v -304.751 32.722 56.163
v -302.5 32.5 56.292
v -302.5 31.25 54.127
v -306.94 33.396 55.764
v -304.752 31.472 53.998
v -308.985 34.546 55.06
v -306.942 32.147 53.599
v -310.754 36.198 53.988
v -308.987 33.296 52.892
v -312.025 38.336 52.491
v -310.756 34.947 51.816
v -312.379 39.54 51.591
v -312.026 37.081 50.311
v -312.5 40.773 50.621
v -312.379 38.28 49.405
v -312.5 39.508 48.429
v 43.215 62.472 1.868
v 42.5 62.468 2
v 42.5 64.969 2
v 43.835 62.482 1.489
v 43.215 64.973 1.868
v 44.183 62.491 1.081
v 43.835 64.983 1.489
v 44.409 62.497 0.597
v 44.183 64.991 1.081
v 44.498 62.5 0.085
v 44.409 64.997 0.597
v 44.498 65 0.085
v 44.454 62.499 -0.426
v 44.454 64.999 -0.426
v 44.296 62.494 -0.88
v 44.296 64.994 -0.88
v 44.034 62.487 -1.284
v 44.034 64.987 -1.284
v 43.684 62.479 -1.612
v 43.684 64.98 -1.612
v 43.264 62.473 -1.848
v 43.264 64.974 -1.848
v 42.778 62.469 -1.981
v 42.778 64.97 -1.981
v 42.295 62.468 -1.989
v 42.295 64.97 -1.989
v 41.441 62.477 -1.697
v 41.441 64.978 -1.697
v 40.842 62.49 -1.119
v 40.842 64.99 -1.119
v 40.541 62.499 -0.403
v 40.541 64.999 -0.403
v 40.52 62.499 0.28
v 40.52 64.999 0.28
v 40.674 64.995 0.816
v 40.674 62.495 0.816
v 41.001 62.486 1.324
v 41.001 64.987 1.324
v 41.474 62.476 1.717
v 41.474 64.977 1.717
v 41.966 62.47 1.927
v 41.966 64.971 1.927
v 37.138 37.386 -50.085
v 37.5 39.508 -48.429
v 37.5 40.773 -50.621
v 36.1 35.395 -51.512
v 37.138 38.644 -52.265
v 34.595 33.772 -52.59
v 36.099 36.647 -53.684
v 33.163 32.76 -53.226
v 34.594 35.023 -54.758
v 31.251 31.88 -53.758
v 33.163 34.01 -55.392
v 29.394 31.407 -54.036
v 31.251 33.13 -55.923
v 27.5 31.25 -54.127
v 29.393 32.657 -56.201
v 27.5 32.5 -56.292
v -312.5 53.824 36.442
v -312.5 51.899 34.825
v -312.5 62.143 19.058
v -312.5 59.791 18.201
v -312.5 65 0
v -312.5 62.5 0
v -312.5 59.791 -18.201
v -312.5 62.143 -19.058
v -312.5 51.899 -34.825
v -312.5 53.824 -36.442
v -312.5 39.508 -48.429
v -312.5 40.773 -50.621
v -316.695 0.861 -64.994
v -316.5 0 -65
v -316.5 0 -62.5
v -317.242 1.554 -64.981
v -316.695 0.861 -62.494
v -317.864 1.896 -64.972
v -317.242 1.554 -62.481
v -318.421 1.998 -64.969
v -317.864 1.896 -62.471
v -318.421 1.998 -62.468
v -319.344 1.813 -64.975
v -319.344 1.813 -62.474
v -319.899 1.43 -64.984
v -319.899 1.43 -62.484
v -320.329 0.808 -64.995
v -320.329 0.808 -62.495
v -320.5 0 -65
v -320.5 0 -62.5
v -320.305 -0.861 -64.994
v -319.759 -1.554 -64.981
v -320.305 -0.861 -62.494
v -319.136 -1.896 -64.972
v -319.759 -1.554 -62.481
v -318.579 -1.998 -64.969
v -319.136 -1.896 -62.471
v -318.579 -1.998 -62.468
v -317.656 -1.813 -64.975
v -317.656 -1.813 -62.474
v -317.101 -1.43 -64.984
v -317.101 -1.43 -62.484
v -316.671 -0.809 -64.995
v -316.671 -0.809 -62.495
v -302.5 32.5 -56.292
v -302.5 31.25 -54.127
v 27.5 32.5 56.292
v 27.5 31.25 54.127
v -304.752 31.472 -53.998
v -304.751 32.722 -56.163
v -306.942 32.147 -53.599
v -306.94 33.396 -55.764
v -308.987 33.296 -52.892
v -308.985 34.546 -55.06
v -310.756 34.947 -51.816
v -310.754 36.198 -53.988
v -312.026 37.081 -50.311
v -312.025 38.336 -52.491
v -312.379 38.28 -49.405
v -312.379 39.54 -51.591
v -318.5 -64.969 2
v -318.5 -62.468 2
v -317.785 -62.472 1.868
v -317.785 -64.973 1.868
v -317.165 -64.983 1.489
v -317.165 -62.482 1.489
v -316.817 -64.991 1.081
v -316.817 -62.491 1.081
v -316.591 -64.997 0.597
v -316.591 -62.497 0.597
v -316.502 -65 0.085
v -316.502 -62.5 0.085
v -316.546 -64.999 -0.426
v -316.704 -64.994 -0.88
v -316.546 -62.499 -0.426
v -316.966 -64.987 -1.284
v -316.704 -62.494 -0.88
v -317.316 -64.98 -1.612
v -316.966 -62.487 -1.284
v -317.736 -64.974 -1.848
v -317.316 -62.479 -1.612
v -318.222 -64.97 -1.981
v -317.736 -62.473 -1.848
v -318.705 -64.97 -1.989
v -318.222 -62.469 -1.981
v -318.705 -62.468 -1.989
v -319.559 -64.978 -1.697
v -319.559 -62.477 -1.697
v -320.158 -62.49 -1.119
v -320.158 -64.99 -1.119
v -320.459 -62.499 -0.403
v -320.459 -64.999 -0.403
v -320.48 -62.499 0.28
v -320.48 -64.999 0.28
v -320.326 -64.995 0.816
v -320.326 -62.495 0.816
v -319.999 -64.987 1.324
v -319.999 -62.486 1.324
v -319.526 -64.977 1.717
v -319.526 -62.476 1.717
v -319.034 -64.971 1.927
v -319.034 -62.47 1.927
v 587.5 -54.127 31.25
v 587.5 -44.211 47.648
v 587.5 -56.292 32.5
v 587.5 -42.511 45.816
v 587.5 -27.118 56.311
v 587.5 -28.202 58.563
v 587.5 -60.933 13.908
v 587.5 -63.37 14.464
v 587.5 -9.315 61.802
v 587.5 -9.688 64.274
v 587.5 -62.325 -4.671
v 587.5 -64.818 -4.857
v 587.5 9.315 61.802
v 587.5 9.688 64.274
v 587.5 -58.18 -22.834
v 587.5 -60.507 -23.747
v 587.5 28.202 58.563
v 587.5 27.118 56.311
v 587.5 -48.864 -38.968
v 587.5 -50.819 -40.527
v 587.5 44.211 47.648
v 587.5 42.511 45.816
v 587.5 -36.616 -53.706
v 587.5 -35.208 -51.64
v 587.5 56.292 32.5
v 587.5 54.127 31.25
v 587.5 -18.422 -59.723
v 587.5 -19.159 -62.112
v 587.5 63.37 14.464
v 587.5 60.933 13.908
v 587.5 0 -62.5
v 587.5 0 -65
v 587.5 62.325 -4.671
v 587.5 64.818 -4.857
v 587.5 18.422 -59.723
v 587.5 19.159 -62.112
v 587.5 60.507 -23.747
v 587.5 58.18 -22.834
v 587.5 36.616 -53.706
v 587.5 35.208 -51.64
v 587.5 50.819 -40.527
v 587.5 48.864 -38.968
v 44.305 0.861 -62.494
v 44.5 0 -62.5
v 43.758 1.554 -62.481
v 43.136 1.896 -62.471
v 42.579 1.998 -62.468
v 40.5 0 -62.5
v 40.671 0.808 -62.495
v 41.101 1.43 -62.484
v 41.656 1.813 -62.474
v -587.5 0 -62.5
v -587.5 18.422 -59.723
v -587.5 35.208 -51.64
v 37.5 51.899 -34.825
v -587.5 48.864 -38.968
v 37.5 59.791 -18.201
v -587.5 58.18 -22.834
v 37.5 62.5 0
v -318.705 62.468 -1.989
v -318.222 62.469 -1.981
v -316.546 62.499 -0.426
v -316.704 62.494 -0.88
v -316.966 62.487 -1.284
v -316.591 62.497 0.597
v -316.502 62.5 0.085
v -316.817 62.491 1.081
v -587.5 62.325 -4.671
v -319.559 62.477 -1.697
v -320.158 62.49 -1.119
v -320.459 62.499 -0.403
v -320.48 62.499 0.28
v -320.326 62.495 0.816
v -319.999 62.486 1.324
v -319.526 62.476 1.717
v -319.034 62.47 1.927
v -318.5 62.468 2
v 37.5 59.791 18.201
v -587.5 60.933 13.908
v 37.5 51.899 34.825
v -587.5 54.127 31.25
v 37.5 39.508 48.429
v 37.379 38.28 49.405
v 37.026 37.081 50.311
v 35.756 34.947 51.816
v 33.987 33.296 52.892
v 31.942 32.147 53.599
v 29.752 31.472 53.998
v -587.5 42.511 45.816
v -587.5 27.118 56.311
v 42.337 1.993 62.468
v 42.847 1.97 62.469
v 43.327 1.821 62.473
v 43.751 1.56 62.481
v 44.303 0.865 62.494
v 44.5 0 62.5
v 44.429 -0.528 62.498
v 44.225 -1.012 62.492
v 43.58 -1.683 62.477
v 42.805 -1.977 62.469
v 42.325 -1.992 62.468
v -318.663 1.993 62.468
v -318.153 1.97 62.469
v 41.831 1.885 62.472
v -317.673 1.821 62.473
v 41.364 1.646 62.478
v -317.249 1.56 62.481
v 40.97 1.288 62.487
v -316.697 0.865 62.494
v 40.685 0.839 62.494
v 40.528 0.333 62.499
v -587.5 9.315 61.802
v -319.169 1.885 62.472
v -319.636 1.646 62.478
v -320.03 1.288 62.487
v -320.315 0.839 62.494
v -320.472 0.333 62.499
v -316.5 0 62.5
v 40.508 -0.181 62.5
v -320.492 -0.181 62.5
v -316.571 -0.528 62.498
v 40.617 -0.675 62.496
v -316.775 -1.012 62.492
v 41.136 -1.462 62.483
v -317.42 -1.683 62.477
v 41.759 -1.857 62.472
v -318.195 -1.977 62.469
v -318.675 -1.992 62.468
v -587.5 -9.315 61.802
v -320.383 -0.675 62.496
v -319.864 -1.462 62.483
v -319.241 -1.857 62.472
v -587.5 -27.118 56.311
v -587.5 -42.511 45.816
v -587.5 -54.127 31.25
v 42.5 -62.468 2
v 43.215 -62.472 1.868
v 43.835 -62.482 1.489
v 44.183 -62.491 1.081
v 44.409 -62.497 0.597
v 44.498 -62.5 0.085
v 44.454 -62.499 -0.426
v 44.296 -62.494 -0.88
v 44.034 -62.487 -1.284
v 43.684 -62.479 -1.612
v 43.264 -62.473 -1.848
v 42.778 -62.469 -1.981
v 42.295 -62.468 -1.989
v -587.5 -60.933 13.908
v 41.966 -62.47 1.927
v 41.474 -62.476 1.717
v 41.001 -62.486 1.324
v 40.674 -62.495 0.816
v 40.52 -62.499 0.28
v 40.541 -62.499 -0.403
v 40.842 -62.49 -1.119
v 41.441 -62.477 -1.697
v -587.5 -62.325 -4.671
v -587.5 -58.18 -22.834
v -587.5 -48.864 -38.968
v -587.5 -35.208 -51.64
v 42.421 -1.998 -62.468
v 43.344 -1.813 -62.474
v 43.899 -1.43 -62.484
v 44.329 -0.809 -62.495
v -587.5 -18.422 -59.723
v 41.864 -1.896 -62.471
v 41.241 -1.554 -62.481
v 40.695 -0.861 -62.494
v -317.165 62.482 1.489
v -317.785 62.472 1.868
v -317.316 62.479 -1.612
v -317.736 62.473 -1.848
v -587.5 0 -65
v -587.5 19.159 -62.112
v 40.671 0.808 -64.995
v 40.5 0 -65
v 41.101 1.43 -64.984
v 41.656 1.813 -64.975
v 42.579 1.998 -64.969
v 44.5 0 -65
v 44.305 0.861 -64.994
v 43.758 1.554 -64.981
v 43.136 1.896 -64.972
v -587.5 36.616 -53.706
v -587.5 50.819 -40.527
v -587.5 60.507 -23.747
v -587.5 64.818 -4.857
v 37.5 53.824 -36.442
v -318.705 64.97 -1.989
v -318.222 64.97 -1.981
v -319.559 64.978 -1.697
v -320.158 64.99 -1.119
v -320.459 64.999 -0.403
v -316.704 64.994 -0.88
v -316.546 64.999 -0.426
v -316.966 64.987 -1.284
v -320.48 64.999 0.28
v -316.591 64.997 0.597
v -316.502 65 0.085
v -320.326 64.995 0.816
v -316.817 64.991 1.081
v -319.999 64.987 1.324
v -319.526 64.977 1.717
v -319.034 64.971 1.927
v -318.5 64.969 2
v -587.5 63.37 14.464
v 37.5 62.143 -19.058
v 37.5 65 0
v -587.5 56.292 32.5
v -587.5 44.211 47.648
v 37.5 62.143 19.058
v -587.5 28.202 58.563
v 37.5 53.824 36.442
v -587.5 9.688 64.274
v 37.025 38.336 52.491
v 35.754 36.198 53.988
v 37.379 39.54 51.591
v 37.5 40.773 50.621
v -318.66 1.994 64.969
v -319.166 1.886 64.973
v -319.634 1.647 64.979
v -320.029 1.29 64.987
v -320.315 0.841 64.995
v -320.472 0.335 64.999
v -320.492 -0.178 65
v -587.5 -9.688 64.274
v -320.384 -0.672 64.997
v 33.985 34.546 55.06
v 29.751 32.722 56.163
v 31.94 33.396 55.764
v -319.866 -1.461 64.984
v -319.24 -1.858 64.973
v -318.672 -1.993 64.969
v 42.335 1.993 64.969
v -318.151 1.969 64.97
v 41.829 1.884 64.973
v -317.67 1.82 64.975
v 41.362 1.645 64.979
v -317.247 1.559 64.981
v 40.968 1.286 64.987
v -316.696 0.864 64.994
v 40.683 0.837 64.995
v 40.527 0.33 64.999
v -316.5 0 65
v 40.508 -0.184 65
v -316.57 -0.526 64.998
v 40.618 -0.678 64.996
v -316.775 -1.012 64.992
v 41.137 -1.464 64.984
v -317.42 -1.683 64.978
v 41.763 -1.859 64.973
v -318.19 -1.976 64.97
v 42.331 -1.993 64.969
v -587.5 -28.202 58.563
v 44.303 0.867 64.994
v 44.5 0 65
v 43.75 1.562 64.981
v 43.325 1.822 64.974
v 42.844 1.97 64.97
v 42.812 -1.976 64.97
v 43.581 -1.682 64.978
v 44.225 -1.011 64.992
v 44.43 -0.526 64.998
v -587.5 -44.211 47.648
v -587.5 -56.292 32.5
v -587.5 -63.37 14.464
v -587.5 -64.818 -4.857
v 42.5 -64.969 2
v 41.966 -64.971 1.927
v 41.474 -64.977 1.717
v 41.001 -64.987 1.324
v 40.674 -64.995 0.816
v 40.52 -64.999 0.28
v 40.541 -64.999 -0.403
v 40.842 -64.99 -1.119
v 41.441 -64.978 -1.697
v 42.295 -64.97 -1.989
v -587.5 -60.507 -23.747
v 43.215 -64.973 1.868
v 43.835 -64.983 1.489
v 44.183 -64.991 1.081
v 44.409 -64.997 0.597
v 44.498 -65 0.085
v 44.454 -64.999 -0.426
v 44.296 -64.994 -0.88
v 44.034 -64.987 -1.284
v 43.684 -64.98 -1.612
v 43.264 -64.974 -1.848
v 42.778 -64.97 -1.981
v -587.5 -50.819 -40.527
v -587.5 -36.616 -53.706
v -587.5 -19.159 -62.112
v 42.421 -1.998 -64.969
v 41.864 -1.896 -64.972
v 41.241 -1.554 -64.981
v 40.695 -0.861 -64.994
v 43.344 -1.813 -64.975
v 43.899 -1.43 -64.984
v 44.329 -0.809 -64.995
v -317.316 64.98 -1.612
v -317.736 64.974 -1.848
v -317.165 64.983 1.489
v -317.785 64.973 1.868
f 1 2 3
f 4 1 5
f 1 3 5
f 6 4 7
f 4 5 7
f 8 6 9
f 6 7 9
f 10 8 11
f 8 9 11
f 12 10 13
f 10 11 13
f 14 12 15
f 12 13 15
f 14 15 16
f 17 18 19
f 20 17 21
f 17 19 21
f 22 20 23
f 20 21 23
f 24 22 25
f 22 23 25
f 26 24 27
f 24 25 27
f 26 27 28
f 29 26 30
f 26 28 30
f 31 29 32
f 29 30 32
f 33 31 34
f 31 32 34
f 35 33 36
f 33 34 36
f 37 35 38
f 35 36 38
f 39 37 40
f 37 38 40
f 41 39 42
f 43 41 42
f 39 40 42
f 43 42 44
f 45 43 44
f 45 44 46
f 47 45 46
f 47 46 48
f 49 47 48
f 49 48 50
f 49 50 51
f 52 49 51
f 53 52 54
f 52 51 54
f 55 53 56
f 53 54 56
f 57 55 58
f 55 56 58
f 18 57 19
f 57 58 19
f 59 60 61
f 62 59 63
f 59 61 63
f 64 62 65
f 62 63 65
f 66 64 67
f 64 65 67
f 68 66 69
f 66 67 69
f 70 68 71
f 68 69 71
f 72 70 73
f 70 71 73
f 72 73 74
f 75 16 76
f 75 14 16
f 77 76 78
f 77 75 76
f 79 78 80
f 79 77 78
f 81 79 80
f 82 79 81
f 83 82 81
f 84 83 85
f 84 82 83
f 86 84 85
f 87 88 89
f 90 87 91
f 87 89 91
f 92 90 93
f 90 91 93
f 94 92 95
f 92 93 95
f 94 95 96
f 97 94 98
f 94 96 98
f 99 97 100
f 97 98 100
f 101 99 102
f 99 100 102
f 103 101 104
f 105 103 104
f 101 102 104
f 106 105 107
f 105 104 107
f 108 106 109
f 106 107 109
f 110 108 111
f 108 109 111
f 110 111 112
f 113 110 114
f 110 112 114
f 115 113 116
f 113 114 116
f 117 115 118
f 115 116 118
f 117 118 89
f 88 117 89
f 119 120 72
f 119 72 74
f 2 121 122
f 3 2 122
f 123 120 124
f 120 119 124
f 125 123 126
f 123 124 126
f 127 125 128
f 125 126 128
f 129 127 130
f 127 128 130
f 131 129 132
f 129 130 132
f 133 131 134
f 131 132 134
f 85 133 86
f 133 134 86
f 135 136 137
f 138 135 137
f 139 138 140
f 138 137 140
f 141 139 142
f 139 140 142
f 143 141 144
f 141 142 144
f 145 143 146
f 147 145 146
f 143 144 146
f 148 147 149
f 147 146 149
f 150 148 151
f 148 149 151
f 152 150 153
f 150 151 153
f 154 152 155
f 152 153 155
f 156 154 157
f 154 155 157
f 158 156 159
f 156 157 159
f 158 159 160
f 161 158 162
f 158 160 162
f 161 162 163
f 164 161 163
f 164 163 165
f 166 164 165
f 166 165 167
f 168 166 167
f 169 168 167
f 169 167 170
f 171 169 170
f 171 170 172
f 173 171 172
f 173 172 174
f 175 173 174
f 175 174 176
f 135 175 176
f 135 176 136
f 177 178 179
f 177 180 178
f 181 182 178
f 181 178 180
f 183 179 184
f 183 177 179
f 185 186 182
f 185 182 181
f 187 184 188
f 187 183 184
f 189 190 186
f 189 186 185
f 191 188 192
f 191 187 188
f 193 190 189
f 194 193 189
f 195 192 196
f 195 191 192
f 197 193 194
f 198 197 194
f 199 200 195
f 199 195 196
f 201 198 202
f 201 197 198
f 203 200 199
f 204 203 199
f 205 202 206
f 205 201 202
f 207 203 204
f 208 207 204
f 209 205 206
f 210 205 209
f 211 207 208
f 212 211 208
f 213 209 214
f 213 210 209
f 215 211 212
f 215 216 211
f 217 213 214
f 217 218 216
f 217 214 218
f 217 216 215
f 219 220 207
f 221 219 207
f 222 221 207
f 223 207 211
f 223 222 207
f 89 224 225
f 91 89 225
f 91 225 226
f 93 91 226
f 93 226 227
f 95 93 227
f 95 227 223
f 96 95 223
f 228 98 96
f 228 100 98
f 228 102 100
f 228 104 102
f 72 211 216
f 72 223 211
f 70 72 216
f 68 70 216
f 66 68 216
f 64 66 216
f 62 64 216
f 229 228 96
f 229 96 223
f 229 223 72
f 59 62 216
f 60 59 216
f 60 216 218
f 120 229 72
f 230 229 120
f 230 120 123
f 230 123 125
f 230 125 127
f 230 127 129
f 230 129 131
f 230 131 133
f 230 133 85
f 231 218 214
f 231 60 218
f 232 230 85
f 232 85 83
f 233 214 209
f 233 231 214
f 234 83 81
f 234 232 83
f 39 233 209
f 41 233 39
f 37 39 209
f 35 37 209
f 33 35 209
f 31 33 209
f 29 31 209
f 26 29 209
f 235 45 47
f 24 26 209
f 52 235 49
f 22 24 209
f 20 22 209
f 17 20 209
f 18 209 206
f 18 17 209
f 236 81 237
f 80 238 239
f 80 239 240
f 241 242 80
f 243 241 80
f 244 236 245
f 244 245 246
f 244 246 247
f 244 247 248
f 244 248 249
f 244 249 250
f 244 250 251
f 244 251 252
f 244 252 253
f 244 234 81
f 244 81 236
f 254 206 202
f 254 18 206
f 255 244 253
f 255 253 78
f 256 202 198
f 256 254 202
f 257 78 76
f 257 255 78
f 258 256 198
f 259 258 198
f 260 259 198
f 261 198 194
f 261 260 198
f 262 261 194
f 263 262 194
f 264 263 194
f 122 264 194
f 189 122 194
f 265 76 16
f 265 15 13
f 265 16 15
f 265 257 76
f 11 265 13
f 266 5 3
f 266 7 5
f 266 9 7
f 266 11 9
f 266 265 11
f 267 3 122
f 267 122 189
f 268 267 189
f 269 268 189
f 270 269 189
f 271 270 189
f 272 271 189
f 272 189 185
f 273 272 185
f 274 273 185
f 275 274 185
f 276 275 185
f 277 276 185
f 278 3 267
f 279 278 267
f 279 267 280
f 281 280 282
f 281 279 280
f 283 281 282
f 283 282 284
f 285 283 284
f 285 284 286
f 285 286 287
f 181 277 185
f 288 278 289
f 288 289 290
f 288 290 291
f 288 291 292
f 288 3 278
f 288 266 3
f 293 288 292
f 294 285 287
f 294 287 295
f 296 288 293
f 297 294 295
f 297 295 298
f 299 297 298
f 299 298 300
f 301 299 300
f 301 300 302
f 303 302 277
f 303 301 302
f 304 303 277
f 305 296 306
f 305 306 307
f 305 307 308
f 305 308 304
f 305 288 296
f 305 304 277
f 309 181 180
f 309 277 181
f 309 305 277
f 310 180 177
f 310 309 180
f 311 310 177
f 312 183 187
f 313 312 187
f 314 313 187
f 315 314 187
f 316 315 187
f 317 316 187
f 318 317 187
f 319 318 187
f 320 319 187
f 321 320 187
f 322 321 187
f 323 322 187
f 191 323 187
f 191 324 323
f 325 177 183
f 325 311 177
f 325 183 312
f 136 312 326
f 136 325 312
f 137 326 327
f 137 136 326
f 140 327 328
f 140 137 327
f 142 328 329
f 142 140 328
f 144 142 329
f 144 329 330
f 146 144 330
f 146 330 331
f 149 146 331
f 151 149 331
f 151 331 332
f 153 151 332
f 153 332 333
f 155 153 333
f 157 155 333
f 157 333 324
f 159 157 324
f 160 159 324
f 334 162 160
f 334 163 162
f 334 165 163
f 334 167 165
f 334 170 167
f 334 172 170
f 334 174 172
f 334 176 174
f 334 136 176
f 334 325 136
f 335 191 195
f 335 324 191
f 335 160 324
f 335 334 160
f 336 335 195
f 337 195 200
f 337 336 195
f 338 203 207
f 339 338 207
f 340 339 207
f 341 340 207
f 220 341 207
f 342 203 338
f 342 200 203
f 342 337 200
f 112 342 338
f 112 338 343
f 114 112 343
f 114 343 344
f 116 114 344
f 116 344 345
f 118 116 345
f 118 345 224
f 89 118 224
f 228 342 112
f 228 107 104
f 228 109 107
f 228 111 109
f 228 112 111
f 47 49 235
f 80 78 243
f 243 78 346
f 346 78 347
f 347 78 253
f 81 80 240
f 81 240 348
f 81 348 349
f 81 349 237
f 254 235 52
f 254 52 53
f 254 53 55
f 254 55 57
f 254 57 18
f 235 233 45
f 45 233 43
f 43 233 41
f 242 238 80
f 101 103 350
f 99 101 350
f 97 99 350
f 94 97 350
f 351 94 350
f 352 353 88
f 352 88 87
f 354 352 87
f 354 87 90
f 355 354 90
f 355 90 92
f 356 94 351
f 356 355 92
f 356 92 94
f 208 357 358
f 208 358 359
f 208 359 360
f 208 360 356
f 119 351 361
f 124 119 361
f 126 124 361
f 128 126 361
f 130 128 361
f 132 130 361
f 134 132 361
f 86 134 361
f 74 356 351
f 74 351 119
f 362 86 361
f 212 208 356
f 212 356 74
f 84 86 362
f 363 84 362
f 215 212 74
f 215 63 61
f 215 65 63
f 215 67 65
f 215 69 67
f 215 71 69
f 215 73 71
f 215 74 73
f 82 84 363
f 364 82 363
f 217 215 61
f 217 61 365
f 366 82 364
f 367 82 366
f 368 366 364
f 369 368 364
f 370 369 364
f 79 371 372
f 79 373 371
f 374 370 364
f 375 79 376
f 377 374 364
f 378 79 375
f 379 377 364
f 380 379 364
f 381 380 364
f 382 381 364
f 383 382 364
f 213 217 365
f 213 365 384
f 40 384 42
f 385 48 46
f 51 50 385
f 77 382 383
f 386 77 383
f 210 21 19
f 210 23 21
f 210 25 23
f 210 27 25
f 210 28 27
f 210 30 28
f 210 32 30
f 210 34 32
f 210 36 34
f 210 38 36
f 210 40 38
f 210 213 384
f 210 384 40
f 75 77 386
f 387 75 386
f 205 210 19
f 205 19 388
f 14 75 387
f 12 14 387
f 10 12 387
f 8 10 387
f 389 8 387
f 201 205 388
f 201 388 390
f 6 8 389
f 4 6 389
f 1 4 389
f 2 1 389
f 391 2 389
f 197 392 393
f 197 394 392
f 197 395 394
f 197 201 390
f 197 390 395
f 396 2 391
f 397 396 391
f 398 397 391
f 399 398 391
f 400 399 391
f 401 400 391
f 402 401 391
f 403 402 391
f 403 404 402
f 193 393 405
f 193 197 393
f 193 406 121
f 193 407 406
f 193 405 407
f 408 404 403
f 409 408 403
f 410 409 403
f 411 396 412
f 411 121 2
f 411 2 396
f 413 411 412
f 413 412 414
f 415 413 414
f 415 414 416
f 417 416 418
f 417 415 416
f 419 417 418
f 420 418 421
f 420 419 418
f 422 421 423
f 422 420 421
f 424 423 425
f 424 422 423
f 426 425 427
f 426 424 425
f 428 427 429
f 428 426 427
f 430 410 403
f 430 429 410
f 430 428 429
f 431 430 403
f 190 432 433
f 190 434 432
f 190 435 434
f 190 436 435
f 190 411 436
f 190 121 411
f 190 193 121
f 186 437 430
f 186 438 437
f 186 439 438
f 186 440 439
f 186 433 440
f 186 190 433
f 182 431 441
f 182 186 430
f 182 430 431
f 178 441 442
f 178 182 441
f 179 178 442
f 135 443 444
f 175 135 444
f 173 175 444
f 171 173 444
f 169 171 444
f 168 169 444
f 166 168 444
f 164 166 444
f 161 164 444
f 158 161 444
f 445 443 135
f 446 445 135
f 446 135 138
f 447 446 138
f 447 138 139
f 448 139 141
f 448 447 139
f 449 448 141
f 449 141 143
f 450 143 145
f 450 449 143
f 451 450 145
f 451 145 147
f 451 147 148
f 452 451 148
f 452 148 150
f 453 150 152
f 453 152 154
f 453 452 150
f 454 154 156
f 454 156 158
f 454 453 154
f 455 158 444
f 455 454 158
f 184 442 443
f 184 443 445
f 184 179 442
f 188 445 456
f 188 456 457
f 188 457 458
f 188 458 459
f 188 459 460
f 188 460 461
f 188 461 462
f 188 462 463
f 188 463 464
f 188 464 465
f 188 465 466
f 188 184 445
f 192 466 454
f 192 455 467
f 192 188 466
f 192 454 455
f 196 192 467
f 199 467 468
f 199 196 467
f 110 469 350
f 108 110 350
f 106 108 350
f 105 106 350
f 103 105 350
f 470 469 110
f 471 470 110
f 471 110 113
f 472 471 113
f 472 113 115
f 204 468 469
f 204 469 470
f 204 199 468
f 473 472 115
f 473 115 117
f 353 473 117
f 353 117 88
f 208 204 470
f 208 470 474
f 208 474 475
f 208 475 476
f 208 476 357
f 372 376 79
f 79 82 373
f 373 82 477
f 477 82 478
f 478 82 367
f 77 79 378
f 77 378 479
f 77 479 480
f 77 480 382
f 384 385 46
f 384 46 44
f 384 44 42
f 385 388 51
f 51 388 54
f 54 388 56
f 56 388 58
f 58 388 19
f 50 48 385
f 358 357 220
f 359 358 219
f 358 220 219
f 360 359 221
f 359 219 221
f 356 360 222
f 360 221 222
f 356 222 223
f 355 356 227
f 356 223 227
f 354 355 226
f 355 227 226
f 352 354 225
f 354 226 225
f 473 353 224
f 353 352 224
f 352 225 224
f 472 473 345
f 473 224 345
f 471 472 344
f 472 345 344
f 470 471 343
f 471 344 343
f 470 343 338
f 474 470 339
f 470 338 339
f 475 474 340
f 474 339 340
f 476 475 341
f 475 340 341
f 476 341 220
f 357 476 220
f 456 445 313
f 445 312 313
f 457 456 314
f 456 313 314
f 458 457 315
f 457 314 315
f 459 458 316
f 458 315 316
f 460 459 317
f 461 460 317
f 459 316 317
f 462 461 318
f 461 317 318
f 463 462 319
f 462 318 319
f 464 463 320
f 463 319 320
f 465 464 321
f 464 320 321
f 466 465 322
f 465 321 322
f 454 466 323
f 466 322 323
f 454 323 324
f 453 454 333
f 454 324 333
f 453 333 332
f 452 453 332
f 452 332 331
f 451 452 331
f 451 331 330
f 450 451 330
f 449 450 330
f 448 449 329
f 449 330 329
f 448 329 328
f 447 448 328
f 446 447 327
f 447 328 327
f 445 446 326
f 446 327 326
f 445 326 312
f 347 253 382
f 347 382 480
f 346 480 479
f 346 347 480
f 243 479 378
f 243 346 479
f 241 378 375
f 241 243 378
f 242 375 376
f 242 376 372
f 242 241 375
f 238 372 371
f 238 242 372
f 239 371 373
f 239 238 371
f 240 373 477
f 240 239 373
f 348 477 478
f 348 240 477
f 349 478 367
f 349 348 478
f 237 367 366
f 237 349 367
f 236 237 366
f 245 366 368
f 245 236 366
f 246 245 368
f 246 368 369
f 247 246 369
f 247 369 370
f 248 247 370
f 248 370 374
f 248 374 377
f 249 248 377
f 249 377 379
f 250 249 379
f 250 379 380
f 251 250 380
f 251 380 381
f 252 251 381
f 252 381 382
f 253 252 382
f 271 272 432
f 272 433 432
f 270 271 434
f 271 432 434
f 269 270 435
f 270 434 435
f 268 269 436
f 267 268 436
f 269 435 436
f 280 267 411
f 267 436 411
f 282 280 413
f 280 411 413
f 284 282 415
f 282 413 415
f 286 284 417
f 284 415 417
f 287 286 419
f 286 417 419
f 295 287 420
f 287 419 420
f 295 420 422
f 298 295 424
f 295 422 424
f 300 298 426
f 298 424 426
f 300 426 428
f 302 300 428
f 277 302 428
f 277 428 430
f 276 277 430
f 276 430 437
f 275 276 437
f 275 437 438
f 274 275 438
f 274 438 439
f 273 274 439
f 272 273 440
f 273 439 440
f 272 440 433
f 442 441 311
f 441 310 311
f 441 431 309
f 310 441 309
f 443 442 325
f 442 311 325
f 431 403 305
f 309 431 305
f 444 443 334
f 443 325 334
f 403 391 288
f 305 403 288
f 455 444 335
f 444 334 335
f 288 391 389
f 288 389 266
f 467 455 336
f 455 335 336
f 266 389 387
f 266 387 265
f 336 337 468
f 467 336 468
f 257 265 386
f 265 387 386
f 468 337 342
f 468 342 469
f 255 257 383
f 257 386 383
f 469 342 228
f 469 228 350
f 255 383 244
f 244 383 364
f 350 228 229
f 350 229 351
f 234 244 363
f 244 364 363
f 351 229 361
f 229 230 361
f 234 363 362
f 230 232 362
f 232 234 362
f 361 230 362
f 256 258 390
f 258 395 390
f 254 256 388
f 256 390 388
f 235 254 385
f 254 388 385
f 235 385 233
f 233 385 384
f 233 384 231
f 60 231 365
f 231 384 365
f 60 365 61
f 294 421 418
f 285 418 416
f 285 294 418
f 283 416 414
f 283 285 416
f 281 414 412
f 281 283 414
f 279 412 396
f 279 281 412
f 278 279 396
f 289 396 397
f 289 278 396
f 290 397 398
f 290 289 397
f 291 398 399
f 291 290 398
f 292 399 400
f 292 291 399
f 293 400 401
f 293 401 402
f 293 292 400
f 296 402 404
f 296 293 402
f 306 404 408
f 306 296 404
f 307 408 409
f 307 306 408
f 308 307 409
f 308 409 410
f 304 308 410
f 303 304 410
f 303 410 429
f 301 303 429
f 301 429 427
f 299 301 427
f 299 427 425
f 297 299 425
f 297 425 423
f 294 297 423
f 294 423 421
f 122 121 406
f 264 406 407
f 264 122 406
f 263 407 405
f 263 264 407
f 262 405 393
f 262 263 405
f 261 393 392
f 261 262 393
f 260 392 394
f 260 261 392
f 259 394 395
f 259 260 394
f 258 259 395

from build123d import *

# Parameters (mm, degrees)
SKETCH1_R               = 65
SKETCH1_R_2             = 62.5
BOSS_EXTRUDE1_DEPTH     = 587.5
CUT_EXTRUDE1_DEPTH      = 37.5
CUT_EXTRUDE1_DEPTH_BACK = 312.5
FILLET1_R               = 10
SKETCH5_R               = 2
CUT_EXTRUDE2_DEPTH      = 100
SKETCH6_R               = 2
CUT_EXTRUDE3_DEPTH      = 135.5


with BuildPart() as part:
    # Sketch1 → Boss-Extrude1 (new, symmetric)
    with BuildSketch(Plane(origin=(0, 0, 0), x_dir=(0, 0, -1), z_dir=(1, 0, 0))):
        Circle(SKETCH1_R)
        Circle(SKETCH1_R_2, mode=Mode.SUBTRACT)
    extrude(amount=BOSS_EXTRUDE1_DEPTH, both=True)

    # Sketch3 → Cut-Extrude1 (cut, two sides: drawn at the far end of the back side and taken through both)
    with BuildSketch(Plane(origin=(0, 0, 0), x_dir=(0, 0, -1), z_dir=(1, 0, 0)).offset(-CUT_EXTRUDE1_DEPTH_BACK)):
        with BuildLine():
            Line((-56.291651246, 32.5), (-54.126587737, 31.25))
            ThreePointArc((-54.126587737, 31.25), (0, 62.5), (54.126587737, 31.25))
            Line((54.126587737, 31.25), (56.291651246, 32.5))
            ThreePointArc((56.291651246, 32.5), (0, 65), (-56.291651246, 32.5))
        make_face()
    extrude(amount=CUT_EXTRUDE1_DEPTH + CUT_EXTRUDE1_DEPTH_BACK, mode=Mode.SUBTRACT)

    # Fillet1
    fillet1_edges = [part.edges().sort_by_distance(p)[0] for p in [
        (-312.5, 31.875, 55.209119491),
        (-312.5, 31.875, -55.209119491),
        (37.5, 31.875, 55.209119491),
        (37.5, 31.875, -55.209119491),
    ]]
    fillet(fillet1_edges, radius=FILLET1_R)

    # Sketch5 → Cut-Extrude2 (cut, symmetric)
    with BuildSketch(Plane(origin=(0, 0, 0), x_dir=(1, 0, 0), z_dir=(0, 1, 0))):
        with Locations(Location((-318.5, 0, 0), (0, 0, 270))):
            Circle(SKETCH5_R)
        with Locations(Location((42.5, 0, 0), (0, 0, 270))):
            Circle(SKETCH5_R)
    extrude(amount=CUT_EXTRUDE2_DEPTH, both=True, mode=Mode.SUBTRACT)

    # Sketch6 → Cut-Extrude3 (cut, symmetric)
    with BuildSketch(Plane.XY):
        with Locations((-318.5, 0)):
            Circle(SKETCH6_R)
        with Locations((42.5, 0)):
            Circle(SKETCH6_R)
    extrude(amount=CUT_EXTRUDE3_DEPTH, both=True, mode=Mode.SUBTRACT)


solid = part.part
